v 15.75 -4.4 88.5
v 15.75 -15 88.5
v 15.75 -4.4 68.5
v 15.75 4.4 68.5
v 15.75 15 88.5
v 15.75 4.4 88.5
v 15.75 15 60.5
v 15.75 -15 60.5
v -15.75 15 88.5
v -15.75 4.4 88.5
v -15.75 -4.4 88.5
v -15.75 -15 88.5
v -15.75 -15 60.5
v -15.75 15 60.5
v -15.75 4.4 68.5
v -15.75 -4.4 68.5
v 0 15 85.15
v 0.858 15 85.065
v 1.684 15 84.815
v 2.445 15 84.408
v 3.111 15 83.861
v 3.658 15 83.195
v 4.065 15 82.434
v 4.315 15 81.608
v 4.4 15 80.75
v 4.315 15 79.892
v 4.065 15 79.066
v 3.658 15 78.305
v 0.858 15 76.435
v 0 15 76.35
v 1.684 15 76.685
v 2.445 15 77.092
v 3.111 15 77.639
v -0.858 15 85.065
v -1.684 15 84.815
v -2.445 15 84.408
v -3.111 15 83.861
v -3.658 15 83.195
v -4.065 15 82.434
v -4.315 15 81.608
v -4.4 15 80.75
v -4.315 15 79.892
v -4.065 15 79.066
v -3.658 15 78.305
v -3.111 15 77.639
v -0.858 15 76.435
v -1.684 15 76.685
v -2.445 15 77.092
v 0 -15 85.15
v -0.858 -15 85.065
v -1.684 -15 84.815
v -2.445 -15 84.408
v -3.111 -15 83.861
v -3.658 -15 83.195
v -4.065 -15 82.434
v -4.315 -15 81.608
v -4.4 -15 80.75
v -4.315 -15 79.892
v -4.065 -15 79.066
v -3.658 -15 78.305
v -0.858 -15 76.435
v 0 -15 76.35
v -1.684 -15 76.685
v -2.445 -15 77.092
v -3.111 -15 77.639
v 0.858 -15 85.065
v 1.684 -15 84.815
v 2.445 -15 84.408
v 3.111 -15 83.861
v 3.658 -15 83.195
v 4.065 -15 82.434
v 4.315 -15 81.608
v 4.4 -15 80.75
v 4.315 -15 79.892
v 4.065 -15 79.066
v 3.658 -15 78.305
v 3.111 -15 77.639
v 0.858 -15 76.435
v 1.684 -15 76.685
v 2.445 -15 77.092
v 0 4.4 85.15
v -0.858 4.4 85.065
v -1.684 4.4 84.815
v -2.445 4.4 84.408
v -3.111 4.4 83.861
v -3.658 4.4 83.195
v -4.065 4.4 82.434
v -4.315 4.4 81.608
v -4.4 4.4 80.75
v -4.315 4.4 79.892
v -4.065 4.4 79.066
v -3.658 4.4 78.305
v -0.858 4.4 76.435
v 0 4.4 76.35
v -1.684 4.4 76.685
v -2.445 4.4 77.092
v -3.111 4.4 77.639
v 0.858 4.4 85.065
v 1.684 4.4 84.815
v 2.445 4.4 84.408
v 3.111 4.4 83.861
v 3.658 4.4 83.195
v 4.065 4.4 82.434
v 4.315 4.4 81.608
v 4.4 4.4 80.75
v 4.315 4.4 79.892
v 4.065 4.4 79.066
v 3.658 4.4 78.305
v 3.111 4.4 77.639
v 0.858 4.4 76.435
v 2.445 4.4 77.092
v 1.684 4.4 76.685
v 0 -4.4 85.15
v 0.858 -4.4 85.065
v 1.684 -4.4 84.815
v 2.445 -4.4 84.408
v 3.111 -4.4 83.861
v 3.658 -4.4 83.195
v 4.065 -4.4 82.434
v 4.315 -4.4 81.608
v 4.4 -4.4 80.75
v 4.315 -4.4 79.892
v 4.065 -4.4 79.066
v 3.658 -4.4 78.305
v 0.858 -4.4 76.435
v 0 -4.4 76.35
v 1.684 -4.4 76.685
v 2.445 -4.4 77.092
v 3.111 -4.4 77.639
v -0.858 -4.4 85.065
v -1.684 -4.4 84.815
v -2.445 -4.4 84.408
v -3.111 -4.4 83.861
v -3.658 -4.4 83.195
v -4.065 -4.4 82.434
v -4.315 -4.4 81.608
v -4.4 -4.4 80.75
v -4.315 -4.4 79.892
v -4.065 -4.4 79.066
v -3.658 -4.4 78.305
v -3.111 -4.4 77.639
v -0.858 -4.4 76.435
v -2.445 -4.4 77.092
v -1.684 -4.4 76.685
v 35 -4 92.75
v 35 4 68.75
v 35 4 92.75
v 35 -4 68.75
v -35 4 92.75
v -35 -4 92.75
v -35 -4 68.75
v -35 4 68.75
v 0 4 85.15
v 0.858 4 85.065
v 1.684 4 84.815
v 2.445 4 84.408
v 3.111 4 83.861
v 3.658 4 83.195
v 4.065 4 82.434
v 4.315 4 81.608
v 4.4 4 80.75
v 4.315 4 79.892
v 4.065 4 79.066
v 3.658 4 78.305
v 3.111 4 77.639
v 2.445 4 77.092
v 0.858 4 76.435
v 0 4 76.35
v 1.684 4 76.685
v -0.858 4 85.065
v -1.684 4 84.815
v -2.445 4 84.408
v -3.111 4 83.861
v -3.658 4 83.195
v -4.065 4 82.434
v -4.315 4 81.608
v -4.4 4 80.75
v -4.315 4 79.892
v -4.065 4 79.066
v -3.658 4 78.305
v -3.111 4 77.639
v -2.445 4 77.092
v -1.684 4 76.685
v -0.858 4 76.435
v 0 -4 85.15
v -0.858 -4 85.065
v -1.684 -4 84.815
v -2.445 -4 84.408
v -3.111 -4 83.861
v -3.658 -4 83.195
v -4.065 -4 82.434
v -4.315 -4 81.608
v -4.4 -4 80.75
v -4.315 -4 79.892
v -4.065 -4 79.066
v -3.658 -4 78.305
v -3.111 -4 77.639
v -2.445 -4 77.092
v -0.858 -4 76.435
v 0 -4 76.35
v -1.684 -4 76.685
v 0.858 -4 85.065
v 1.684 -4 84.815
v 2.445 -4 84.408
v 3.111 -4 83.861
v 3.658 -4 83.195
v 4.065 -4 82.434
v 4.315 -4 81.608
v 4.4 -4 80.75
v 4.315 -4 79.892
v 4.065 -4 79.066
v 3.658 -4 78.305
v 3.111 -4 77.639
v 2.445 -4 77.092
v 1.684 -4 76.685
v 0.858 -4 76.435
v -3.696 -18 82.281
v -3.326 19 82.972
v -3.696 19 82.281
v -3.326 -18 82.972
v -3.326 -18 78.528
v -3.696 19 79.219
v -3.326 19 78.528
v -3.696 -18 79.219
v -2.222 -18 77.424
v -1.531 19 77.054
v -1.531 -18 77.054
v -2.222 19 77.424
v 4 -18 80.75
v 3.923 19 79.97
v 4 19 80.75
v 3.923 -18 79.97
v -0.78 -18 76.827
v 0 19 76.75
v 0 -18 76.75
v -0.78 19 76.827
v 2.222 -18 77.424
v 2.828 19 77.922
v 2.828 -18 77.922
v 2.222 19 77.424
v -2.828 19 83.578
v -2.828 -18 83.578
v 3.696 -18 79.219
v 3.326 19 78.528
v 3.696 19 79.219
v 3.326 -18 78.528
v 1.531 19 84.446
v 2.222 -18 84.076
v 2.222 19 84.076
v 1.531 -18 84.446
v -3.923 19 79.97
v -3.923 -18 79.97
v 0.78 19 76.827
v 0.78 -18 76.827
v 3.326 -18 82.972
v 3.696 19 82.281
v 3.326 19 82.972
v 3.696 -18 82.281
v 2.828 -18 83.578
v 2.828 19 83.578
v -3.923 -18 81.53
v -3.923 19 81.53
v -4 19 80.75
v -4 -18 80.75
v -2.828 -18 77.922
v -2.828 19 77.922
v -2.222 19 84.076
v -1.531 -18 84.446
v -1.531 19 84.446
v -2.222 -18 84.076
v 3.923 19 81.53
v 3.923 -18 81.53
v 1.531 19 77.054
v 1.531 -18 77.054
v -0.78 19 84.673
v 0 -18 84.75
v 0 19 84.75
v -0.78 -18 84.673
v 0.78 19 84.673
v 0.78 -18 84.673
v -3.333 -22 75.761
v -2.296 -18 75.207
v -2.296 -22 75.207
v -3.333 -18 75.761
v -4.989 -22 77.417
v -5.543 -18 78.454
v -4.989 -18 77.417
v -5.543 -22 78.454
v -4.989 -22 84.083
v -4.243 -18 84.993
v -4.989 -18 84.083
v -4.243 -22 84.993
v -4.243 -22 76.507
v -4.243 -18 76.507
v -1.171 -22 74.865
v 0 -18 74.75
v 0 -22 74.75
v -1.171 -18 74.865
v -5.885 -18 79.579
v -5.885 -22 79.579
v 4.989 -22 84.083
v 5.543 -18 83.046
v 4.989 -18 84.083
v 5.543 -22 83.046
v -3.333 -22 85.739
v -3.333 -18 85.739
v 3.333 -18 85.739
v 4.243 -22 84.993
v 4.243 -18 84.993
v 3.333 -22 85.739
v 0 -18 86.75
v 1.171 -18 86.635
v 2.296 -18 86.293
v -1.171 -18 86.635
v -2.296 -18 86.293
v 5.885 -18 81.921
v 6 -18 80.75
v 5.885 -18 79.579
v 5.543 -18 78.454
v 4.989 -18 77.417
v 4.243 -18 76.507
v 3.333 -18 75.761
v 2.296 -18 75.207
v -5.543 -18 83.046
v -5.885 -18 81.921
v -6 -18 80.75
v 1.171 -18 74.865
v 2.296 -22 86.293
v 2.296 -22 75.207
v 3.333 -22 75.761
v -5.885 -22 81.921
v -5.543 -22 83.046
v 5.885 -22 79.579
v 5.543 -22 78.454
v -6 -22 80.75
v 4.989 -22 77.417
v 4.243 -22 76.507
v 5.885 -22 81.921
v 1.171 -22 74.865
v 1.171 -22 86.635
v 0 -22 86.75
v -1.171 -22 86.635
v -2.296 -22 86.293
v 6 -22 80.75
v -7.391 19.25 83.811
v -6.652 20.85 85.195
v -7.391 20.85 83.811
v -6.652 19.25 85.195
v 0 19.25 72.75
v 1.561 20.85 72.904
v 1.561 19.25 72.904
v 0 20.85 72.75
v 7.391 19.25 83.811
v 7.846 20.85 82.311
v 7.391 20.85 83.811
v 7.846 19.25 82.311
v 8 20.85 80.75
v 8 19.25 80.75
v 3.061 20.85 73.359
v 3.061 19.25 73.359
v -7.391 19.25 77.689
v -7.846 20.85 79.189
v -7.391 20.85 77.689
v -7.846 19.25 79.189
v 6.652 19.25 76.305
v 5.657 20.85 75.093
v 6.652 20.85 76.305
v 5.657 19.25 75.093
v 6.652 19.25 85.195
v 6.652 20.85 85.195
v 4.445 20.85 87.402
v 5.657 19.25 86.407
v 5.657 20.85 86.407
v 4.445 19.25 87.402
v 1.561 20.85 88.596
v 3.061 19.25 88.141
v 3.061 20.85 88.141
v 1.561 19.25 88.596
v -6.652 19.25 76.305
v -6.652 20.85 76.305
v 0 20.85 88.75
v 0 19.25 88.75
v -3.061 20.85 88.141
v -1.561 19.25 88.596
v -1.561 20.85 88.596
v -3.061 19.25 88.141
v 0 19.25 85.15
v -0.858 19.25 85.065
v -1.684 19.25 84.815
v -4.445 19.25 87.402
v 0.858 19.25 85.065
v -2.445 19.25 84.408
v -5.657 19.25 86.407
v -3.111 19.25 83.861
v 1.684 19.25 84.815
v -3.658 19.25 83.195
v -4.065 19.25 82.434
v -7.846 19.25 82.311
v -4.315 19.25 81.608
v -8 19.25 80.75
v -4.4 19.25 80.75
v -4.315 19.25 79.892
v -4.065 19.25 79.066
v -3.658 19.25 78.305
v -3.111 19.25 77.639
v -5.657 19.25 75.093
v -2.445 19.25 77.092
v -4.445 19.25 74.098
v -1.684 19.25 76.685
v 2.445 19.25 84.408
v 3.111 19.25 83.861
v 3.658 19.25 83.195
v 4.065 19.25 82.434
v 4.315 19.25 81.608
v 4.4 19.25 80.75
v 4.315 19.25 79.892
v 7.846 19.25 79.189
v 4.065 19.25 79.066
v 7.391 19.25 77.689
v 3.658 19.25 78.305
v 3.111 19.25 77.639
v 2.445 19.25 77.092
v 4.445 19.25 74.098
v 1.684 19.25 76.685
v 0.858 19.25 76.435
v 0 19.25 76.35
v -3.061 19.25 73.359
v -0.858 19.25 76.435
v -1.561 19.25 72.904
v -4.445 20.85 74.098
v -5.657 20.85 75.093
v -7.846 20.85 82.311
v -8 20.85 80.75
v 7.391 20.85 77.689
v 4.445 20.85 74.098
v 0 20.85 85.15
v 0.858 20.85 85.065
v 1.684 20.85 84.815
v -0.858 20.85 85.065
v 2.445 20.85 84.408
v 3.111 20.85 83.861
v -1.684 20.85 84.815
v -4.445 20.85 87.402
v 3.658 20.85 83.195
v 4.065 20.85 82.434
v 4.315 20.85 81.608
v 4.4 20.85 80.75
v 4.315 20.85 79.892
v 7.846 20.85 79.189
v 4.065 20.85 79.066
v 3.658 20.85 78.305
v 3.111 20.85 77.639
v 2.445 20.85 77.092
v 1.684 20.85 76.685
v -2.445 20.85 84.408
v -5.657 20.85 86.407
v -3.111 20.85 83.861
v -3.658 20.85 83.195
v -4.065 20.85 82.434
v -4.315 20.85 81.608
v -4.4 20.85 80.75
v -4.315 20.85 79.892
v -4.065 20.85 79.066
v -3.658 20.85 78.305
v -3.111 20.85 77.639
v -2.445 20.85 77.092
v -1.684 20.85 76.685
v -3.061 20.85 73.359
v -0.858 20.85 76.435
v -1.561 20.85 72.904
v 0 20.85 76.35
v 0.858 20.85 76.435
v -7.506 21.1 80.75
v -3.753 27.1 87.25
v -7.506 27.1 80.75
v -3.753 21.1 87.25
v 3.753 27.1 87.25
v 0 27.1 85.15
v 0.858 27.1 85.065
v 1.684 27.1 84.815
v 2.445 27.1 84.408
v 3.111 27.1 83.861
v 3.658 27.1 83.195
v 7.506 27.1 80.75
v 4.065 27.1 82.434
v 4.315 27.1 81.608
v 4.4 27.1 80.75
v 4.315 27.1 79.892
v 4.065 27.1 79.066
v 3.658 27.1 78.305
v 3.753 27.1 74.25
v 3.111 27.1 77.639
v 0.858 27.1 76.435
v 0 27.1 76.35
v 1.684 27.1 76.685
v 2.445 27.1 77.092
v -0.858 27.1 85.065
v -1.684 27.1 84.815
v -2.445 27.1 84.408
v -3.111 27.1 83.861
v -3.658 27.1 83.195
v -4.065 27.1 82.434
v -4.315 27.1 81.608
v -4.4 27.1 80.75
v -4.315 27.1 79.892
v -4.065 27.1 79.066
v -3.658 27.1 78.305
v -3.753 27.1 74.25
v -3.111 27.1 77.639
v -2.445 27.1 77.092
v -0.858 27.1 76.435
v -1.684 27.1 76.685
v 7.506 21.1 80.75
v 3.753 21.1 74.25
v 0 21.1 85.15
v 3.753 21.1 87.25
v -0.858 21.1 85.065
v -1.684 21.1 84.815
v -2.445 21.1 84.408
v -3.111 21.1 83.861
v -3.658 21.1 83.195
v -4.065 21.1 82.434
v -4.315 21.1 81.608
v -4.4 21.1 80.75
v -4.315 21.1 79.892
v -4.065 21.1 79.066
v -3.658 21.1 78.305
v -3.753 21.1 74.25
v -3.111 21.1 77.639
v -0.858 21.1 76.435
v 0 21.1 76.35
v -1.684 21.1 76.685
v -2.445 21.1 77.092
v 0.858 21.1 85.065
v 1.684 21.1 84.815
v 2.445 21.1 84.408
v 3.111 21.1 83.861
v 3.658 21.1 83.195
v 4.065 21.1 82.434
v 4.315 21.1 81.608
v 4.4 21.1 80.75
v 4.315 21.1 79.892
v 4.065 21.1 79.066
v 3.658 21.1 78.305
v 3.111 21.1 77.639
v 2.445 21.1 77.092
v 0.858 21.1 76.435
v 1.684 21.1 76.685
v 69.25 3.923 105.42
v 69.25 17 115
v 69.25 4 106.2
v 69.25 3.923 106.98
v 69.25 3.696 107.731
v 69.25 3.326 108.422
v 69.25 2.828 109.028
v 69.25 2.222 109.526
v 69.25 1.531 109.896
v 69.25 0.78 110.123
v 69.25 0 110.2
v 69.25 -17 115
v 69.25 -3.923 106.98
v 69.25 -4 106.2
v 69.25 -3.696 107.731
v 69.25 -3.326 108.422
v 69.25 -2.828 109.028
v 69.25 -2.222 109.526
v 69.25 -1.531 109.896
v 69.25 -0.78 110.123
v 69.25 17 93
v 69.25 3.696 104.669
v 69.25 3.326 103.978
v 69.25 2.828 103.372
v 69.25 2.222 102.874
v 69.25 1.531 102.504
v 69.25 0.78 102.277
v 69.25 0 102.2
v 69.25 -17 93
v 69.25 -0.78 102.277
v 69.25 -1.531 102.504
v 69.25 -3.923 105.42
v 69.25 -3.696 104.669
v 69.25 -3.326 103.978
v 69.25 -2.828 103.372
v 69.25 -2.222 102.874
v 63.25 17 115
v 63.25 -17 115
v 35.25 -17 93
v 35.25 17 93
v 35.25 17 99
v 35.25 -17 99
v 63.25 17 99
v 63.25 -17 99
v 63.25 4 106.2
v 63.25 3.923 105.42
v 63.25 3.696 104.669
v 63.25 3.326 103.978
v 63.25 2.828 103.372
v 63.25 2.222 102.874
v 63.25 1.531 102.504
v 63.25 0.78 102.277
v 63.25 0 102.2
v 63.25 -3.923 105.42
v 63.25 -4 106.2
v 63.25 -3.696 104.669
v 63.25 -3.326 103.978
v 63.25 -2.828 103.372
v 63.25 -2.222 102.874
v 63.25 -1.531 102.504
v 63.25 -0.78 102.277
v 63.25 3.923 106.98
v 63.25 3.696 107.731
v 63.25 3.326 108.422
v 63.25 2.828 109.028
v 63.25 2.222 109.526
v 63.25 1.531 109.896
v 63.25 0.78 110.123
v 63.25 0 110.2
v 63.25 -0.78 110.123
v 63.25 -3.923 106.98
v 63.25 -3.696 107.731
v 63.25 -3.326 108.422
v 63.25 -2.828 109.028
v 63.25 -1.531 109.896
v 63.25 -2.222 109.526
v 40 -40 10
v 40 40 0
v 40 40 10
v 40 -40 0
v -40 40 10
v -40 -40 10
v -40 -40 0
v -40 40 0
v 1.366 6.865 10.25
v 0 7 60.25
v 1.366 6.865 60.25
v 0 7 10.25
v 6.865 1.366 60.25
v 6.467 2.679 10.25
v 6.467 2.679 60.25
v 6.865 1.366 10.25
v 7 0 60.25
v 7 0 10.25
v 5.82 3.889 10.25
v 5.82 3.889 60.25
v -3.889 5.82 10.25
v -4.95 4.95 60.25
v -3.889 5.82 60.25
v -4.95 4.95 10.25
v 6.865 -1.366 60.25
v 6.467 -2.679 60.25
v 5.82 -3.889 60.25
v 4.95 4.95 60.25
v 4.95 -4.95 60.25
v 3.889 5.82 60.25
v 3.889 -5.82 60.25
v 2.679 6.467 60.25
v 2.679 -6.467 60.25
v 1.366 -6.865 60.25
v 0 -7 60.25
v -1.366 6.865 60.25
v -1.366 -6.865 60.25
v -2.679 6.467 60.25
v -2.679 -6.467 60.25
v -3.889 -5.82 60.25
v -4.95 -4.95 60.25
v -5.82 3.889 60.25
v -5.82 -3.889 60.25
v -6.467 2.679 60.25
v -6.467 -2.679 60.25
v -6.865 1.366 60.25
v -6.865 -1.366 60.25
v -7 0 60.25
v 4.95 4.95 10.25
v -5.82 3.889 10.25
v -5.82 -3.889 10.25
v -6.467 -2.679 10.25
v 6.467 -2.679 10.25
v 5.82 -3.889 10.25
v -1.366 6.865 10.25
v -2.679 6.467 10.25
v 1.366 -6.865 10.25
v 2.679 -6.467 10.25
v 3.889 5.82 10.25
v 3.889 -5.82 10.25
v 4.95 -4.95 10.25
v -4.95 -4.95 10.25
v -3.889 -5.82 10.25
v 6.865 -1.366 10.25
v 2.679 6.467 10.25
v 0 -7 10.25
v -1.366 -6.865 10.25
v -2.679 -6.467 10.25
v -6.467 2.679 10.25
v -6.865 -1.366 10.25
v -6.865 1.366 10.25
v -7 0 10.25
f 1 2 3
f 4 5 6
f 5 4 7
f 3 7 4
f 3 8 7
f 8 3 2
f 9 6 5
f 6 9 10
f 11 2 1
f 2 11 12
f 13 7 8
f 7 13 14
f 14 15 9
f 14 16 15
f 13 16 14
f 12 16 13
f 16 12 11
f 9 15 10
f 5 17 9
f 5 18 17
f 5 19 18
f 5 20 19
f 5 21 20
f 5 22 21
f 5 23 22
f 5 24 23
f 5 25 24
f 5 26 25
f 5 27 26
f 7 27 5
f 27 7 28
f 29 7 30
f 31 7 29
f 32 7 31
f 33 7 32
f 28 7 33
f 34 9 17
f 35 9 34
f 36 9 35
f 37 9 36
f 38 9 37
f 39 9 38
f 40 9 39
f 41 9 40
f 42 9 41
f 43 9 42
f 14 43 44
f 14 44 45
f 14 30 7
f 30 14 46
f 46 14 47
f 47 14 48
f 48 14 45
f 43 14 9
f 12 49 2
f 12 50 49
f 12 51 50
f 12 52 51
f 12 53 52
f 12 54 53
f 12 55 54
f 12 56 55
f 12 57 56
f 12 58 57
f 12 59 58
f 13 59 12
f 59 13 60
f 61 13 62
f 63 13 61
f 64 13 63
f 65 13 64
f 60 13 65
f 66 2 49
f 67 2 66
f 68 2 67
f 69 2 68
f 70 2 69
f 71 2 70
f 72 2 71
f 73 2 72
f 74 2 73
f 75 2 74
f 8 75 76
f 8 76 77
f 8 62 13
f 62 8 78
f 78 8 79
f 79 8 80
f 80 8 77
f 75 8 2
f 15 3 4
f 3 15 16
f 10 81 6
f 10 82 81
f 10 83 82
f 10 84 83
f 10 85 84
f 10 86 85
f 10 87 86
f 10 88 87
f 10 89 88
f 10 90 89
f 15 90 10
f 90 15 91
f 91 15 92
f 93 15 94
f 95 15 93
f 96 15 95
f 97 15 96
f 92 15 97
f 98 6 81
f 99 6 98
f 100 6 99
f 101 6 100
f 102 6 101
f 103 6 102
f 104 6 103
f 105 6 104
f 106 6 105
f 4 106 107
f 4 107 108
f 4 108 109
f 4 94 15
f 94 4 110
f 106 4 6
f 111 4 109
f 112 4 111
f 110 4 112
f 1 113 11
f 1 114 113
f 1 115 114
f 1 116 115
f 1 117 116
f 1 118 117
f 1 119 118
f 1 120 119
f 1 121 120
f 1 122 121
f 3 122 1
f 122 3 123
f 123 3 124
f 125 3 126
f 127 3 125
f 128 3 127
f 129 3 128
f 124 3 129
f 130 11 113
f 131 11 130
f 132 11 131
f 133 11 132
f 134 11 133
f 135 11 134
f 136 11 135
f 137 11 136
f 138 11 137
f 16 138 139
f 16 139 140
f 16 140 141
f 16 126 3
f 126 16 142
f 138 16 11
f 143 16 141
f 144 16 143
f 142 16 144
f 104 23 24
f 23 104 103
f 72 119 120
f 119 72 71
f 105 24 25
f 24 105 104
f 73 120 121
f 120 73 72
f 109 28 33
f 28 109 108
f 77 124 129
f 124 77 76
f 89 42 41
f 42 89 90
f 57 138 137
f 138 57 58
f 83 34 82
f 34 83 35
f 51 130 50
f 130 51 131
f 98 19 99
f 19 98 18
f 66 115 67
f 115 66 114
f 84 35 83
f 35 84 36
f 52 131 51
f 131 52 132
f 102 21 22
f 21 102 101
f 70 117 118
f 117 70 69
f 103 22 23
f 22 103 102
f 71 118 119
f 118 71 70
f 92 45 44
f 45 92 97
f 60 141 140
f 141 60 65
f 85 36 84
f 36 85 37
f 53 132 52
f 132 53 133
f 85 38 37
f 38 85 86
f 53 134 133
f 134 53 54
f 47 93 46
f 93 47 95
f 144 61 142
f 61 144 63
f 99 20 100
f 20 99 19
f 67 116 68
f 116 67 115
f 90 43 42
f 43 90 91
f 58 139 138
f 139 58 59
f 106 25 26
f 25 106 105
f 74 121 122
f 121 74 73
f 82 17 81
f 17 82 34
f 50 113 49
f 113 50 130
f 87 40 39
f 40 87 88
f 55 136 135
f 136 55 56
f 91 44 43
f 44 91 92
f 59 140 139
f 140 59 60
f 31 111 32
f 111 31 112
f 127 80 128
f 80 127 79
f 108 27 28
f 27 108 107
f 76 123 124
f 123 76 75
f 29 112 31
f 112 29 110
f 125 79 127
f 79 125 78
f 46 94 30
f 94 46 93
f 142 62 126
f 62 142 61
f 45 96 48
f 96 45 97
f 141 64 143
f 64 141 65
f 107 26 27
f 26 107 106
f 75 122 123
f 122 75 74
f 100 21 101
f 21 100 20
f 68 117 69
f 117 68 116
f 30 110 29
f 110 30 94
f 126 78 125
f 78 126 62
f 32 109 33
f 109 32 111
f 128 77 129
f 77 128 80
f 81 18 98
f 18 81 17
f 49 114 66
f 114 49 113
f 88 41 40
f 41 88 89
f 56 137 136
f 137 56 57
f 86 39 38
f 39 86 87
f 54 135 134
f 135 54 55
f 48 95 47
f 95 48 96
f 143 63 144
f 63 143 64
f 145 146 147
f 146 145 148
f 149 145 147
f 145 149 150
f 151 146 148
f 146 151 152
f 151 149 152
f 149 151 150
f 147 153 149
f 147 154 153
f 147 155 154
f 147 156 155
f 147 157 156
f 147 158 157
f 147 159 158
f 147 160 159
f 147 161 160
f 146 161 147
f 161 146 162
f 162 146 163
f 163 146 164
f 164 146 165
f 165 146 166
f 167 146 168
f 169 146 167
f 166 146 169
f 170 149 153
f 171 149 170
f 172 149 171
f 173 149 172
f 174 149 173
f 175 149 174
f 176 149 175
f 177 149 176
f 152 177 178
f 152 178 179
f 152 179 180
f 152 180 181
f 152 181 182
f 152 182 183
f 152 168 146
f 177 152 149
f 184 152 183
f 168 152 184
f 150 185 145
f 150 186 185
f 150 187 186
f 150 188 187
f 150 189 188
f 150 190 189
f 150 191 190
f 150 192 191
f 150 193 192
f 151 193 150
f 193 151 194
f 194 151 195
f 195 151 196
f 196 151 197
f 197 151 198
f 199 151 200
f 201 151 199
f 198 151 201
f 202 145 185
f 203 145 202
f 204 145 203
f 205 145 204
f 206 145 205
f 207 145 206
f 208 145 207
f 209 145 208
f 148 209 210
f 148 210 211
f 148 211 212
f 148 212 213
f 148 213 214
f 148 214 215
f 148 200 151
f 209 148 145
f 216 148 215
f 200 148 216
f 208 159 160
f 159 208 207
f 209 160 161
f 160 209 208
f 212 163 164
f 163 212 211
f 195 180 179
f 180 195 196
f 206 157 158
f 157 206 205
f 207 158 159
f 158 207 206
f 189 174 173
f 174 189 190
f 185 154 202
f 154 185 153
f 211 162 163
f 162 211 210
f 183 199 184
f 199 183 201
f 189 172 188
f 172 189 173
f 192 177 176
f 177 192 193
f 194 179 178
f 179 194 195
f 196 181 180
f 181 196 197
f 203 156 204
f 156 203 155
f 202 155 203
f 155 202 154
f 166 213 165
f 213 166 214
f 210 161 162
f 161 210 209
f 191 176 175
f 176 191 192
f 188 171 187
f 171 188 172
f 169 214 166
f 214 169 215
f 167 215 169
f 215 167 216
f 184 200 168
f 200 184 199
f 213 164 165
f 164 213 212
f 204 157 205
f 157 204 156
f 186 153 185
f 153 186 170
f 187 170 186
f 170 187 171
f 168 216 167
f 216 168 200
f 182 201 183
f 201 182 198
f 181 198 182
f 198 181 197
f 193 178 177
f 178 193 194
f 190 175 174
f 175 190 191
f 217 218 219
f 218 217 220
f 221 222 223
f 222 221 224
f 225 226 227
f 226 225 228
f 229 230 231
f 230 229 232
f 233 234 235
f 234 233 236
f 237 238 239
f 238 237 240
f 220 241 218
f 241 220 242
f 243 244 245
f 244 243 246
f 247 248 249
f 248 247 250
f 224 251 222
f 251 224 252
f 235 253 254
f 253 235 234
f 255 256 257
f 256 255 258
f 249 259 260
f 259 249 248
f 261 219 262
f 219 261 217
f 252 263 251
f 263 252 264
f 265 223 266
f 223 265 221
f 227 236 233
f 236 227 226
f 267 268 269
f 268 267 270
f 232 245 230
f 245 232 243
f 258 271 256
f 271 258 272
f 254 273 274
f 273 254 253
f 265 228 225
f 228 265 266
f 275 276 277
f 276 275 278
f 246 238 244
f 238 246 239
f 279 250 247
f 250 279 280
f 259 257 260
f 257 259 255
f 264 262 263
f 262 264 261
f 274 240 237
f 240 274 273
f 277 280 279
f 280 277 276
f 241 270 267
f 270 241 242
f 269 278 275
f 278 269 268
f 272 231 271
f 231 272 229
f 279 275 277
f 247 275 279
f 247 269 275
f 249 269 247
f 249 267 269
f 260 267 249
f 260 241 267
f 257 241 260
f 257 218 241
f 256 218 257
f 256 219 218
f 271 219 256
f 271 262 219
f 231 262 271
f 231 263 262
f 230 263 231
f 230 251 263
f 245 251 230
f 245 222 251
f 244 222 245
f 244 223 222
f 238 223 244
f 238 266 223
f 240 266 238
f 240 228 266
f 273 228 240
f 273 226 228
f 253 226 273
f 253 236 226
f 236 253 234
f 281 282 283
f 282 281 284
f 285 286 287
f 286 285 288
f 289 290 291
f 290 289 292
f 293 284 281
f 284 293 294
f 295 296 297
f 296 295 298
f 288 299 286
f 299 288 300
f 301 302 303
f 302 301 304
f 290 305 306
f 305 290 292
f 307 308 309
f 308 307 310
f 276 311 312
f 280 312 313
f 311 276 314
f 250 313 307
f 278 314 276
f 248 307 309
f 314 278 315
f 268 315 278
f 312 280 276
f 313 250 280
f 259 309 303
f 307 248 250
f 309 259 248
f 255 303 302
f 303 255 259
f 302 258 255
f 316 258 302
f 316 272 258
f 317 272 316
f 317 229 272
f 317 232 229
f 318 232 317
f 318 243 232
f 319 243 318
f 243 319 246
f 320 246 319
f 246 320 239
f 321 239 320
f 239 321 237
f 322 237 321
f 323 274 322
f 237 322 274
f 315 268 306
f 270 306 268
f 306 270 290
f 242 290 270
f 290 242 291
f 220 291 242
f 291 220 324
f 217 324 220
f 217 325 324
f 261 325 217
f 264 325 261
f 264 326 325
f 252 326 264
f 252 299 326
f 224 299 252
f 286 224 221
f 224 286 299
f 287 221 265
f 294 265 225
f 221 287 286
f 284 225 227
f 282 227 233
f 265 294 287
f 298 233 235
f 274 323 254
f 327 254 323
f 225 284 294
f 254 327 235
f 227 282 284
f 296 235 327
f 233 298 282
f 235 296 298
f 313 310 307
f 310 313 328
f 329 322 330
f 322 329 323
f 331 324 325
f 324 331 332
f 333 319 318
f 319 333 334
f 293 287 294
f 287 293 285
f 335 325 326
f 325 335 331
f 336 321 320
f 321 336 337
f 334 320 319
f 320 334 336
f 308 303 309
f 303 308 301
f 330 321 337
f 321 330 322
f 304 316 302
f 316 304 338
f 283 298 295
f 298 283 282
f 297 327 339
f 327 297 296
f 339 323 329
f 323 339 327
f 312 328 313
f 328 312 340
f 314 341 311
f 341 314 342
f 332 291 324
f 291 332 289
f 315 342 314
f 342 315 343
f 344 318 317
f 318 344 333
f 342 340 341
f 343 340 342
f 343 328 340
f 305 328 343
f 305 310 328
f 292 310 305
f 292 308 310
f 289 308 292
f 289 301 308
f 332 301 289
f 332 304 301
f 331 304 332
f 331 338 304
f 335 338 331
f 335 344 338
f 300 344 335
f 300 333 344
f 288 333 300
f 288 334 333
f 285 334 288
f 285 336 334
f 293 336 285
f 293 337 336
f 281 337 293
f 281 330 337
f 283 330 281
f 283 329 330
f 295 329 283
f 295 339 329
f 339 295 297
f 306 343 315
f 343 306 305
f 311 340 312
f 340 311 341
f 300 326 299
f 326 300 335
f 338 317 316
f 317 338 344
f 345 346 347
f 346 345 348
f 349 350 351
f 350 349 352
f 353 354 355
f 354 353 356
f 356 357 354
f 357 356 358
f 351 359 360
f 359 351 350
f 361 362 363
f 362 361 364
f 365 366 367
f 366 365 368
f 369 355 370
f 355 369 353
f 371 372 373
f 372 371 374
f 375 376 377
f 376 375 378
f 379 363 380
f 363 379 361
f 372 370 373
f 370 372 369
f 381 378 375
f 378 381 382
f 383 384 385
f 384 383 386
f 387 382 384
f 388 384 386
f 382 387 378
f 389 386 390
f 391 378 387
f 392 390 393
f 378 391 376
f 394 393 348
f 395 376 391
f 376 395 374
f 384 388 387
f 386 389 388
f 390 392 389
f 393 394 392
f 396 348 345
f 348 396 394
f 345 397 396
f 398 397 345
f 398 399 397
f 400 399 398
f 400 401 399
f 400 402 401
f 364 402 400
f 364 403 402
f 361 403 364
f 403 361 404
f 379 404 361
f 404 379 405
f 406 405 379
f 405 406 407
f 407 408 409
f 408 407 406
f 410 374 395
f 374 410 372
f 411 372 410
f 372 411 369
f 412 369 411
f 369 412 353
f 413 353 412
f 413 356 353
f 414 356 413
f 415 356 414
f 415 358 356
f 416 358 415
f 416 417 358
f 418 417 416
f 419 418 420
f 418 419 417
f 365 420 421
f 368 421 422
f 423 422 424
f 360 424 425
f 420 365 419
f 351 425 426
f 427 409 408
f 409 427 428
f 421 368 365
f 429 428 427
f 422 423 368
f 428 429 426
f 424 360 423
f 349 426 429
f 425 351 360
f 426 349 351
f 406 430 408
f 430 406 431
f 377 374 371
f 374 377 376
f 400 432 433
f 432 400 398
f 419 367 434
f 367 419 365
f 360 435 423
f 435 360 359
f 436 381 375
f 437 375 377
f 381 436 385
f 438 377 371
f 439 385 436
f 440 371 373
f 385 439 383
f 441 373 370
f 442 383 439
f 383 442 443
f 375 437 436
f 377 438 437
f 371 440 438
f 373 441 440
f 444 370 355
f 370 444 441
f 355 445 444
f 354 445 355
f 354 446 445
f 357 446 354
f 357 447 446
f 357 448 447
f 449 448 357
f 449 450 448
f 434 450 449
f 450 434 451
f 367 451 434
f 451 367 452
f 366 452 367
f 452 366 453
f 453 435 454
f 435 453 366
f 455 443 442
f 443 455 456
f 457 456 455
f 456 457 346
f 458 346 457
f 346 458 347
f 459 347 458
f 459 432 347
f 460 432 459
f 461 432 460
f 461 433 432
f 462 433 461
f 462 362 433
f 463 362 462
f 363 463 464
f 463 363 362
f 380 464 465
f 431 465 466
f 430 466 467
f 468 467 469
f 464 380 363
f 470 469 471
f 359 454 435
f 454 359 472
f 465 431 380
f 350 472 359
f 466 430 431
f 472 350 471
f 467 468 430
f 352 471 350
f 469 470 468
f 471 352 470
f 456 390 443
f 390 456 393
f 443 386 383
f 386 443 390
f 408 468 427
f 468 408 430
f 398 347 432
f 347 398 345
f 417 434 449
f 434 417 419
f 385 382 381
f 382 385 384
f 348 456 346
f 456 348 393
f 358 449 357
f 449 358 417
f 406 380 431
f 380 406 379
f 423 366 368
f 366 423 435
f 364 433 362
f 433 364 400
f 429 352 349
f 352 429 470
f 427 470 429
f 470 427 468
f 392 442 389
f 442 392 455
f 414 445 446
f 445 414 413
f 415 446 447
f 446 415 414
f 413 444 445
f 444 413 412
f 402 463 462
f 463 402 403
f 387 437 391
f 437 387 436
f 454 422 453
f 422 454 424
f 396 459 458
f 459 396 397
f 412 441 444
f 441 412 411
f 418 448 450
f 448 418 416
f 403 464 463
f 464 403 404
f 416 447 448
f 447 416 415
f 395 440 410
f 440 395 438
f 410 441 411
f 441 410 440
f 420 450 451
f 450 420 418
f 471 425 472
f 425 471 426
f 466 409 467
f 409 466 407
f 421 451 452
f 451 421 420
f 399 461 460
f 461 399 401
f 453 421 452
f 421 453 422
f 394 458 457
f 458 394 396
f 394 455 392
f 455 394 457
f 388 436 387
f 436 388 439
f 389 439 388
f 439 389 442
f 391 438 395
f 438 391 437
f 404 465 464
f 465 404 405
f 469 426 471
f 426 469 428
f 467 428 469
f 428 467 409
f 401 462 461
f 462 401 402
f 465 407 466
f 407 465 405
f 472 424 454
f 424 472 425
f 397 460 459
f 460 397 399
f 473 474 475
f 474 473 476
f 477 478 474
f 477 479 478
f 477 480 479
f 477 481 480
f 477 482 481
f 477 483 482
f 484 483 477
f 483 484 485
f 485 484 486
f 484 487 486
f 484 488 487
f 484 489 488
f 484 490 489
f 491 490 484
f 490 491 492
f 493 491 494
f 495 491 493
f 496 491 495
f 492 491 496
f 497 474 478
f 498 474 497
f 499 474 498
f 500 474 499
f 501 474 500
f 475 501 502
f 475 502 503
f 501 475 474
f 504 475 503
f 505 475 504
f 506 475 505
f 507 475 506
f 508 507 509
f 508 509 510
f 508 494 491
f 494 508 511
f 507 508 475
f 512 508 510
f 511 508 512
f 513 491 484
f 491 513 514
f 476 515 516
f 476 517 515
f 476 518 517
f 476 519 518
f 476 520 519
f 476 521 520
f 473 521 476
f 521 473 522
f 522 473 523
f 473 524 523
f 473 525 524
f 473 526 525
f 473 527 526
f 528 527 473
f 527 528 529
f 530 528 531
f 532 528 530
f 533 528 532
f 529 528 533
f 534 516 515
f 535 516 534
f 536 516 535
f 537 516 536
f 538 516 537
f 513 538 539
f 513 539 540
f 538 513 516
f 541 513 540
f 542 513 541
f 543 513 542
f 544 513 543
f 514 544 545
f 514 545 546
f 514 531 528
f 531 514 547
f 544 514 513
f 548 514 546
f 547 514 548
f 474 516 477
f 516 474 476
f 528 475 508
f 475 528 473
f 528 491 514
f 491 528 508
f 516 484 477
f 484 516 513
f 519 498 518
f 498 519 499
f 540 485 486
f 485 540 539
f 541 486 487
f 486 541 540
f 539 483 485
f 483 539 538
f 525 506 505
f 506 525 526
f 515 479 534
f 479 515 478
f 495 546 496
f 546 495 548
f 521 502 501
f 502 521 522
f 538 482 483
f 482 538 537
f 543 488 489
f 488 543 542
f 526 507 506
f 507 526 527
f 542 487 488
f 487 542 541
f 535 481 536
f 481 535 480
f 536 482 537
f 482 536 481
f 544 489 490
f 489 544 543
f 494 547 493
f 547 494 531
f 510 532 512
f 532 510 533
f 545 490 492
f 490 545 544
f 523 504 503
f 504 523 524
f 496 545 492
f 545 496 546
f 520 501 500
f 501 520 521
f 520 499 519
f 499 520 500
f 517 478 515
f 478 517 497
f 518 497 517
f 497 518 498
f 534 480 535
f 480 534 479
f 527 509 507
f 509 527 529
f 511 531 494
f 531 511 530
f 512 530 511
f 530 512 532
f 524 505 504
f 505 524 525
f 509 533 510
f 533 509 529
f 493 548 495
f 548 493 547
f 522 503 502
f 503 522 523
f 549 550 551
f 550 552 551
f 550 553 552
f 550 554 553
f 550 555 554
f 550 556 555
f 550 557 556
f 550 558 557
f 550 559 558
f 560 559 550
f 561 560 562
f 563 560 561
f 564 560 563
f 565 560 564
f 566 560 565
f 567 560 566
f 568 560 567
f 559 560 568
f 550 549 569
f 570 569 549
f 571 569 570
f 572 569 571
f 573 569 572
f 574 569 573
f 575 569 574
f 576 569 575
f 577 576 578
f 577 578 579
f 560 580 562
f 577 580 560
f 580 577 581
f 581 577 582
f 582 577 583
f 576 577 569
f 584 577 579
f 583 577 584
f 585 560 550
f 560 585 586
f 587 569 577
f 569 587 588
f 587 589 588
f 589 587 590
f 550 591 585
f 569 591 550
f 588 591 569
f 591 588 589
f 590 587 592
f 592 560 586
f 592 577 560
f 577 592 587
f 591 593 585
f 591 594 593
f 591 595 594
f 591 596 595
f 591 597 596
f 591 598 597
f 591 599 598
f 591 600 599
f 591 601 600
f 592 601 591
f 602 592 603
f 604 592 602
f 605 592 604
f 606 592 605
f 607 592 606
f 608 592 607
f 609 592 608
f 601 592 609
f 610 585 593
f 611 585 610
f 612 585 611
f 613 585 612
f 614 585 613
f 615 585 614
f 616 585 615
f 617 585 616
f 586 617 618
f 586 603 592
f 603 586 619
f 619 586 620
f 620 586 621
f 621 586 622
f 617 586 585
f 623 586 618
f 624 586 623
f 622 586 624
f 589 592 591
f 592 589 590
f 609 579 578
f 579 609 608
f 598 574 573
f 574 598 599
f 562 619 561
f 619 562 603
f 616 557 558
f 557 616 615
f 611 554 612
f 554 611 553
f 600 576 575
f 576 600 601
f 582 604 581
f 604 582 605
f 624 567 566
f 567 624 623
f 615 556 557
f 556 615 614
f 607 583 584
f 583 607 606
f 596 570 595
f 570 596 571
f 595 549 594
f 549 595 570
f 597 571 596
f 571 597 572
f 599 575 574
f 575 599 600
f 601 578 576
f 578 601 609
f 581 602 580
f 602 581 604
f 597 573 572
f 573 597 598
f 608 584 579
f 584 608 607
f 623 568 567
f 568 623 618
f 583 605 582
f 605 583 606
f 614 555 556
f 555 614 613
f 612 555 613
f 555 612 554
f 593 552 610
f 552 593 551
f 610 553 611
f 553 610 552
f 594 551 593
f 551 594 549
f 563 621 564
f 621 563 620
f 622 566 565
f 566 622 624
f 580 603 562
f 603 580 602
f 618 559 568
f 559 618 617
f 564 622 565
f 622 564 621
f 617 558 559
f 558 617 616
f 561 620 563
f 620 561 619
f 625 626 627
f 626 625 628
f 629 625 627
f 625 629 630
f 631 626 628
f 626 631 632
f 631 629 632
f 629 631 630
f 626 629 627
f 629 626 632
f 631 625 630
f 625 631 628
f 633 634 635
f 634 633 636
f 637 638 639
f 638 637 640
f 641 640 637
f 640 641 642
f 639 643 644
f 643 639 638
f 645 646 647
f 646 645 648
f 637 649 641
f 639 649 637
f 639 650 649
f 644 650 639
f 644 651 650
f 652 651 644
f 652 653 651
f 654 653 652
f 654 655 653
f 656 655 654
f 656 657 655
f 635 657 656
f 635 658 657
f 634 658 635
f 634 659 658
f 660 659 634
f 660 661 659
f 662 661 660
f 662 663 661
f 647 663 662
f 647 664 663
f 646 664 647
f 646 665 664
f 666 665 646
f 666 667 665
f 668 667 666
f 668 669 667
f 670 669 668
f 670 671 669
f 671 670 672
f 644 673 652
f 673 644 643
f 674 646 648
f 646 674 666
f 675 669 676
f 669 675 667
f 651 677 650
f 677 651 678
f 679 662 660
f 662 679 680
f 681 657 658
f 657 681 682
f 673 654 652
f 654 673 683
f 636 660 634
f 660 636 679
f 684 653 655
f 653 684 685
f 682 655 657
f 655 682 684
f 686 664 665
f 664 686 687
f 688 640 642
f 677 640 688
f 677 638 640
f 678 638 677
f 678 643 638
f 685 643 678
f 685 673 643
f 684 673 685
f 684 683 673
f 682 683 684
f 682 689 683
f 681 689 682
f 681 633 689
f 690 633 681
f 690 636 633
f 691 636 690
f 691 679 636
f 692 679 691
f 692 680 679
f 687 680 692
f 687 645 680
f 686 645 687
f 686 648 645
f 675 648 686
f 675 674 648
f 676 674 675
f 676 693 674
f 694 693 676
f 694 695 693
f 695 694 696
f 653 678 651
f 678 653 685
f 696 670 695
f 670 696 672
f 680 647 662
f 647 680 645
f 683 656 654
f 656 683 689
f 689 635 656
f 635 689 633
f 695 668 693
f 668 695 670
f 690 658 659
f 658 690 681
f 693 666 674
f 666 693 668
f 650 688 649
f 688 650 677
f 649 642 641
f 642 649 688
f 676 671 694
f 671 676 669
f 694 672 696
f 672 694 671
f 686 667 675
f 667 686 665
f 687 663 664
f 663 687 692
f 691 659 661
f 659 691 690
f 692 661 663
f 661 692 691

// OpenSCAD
$fn = 32;

// ------------------------------------------------------------------------
// Lamp arm: column d14 x 50 mm, arm 70 mm
// Every part is its own module, assembly() places every instance.
// ------------------------------------------------------------------------

// --- part 1 ---
module lamp_base() {
  difference() {
    translate([-40, -40, 0]) cube([80, 80, 10]);
  }
}

// --- part 2 ---
module lamp_column() {
  cylinder(h = 50, d = 14);
}

// --- part 3 ---
module head_fork() {
  difference() {
    translate([-15.75, -15, 0]) cube([31.5, 30, 28]);
    translate([-16.75, -4.4, 8]) cube([33.5, 8.8, 21]);
    translate([0, 0, 20.25]) rotate([90, 0, 0]) cylinder(h = 32, d = 8.8, center = true);
  }
}

// --- part 4 ---
module lamp_arm() {
  difference() {
    translate([-35, -4, 0]) cube([70, 8, 24]);
    translate([0, 0, 12]) rotate([90, 0, 0]) cylinder(h = 10, d = 8.8, center = true);
  }
}

// --- part 5 ---
module arm_pin() {
  rotate([0, 90, 0]) cylinder(h = 38, d = 8, center = true);
  translate([-22, 0, 0]) rotate([0, 90, 0]) cylinder(h = 4, d = 12);
}

// --- part 6 ---
module arm_washer() {
  difference() {
      translate([0, 0, 0]) cylinder(h = 1.6, d = 16);
      translate([0, 0, -1]) cylinder(h = 3.6, d = 8.8);
    }
}

// --- part 7 ---
module arm_nut() {
  difference() {
    linear_extrude(height = 6) polygon(points = [[7.506, 0], [3.753, 6.5], [-3.753, 6.5], [-7.506, 0], [-3.753, -6.5], [3.753, -6.5]]);
    translate([0, 0, -1]) cylinder(h = 8, d = 8.8);
  }
}

// --- part 8 ---
module shade_bracket() {
  difference() {
    translate([-17, -17, 0]) cube([34, 34, 22]);
    translate([-18, -18, 6]) cube([29, 36, 17]);
    translate([14, 0, 13.2]) rotate([0, 90, 0]) cylinder(h = 8, d = 8, center = true);
  }
}

// --- assembly ---
module assembly() {
  color([0.80, 0.24, 0.20]) translate([0, 0, 0]) rotate([0, 0, 0]) lamp_base();
  color([0.20, 0.45, 0.75]) translate([0, 0, 10.25]) rotate([0, 0, 0]) lamp_column();
  color([0.25, 0.62, 0.32]) translate([0, 0, 60.5]) rotate([0, 0, 0]) head_fork();
  color([0.92, 0.70, 0.18]) translate([0, 0, 68.75]) rotate([0, 0, 0]) lamp_arm();
  color([0.58, 0.35, 0.70]) translate([0, 0, 80.75]) rotate([0, 0, 90]) arm_pin();
  color([0.16, 0.66, 0.66]) translate([0, 20.85, 80.75]) rotate([90, 0, 0]) arm_washer();
  color([0.85, 0.48, 0.18]) translate([0, 27.1, 80.75]) rotate([90, 0, 0]) arm_nut();
  color([0.55, 0.60, 0.65]) translate([52.25, 0, 93]) rotate([0, 0, 0]) shade_bracket();
}

assembly();
